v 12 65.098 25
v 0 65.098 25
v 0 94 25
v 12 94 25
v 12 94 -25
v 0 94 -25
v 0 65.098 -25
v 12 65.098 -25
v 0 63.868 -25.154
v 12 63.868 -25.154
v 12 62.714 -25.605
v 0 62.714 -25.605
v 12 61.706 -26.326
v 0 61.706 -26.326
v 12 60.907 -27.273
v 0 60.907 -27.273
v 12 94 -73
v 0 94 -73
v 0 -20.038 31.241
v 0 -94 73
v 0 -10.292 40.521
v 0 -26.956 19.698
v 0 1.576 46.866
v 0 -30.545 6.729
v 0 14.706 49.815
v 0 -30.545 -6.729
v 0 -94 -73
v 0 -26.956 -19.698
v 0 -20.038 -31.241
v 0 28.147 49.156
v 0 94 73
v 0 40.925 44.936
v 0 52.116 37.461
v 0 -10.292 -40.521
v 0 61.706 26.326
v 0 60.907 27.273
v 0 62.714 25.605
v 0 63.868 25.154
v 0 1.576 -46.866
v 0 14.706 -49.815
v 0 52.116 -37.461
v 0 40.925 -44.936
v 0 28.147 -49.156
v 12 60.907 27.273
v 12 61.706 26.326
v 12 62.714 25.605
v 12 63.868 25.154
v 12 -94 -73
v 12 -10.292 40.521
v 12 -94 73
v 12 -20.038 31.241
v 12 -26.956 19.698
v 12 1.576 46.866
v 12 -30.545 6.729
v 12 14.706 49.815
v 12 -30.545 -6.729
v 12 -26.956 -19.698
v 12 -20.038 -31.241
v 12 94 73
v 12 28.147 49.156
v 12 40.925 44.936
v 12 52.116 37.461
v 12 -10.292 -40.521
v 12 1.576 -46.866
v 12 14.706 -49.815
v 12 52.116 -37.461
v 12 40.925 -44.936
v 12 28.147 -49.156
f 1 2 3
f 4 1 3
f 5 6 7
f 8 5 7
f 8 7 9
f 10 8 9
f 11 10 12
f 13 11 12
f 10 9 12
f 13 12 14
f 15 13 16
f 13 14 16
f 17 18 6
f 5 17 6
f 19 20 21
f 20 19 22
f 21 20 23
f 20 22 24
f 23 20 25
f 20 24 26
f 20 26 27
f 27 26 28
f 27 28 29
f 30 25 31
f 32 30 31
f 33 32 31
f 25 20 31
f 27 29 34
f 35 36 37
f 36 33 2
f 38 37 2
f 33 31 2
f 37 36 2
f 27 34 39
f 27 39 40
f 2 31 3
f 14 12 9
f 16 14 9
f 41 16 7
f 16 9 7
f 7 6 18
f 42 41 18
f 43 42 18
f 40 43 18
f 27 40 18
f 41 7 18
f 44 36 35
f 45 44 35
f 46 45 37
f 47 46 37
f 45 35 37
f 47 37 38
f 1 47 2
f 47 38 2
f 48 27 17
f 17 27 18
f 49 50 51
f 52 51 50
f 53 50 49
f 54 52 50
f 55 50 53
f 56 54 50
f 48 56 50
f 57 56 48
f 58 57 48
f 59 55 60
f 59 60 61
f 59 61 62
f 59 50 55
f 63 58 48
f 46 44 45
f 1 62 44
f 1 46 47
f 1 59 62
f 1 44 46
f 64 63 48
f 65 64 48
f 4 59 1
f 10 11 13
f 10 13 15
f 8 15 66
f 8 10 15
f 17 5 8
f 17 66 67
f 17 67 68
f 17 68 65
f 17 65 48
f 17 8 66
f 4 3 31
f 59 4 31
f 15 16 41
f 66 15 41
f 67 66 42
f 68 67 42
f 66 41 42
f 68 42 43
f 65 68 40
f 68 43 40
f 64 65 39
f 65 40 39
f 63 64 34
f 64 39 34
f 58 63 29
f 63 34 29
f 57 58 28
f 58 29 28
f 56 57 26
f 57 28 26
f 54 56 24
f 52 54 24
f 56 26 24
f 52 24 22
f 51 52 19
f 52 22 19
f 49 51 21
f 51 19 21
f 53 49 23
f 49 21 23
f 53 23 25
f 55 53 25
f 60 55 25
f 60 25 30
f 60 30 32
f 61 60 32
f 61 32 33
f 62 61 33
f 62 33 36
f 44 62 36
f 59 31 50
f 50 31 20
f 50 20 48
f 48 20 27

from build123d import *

# Parameters (mm, degrees)
BOSS_EXTRUDE1_DEPTH = 12


with BuildPart() as part:
    # Sketch1 → Boss-Extrude1 (new body)
    with BuildSketch(Plane(origin=(0, 0, 0), x_dir=(0, 0, -1), z_dir=(1, 0, 0))):
        with BuildLine():
            Line((73, 94), (25, 94))
            Line((25, 94), (25, 65.097722286))
            ThreePointArc((25, 65.097722286), (25.604754635, 62.714065813), (27.272727273, 60.90702026))
            ThreePointArc((27.272727273, 60.90702026), (0, -31), (-27.272727273, 60.90702026))
            ThreePointArc((-27.272727273, 60.90702026), (-25.604754635, 62.714065813), (-25, 65.097722286))
            Line((-25, 65.097722286), (-25, 94))
            Line((-25, 94), (-73, 94))
            Line((-73, 94), (-73, -94))
            Line((-73, -94), (73, -94))
            Line((73, -94), (73, 94))
        make_face()
    extrude(amount=BOSS_EXTRUDE1_DEPTH)


solid = part.part
